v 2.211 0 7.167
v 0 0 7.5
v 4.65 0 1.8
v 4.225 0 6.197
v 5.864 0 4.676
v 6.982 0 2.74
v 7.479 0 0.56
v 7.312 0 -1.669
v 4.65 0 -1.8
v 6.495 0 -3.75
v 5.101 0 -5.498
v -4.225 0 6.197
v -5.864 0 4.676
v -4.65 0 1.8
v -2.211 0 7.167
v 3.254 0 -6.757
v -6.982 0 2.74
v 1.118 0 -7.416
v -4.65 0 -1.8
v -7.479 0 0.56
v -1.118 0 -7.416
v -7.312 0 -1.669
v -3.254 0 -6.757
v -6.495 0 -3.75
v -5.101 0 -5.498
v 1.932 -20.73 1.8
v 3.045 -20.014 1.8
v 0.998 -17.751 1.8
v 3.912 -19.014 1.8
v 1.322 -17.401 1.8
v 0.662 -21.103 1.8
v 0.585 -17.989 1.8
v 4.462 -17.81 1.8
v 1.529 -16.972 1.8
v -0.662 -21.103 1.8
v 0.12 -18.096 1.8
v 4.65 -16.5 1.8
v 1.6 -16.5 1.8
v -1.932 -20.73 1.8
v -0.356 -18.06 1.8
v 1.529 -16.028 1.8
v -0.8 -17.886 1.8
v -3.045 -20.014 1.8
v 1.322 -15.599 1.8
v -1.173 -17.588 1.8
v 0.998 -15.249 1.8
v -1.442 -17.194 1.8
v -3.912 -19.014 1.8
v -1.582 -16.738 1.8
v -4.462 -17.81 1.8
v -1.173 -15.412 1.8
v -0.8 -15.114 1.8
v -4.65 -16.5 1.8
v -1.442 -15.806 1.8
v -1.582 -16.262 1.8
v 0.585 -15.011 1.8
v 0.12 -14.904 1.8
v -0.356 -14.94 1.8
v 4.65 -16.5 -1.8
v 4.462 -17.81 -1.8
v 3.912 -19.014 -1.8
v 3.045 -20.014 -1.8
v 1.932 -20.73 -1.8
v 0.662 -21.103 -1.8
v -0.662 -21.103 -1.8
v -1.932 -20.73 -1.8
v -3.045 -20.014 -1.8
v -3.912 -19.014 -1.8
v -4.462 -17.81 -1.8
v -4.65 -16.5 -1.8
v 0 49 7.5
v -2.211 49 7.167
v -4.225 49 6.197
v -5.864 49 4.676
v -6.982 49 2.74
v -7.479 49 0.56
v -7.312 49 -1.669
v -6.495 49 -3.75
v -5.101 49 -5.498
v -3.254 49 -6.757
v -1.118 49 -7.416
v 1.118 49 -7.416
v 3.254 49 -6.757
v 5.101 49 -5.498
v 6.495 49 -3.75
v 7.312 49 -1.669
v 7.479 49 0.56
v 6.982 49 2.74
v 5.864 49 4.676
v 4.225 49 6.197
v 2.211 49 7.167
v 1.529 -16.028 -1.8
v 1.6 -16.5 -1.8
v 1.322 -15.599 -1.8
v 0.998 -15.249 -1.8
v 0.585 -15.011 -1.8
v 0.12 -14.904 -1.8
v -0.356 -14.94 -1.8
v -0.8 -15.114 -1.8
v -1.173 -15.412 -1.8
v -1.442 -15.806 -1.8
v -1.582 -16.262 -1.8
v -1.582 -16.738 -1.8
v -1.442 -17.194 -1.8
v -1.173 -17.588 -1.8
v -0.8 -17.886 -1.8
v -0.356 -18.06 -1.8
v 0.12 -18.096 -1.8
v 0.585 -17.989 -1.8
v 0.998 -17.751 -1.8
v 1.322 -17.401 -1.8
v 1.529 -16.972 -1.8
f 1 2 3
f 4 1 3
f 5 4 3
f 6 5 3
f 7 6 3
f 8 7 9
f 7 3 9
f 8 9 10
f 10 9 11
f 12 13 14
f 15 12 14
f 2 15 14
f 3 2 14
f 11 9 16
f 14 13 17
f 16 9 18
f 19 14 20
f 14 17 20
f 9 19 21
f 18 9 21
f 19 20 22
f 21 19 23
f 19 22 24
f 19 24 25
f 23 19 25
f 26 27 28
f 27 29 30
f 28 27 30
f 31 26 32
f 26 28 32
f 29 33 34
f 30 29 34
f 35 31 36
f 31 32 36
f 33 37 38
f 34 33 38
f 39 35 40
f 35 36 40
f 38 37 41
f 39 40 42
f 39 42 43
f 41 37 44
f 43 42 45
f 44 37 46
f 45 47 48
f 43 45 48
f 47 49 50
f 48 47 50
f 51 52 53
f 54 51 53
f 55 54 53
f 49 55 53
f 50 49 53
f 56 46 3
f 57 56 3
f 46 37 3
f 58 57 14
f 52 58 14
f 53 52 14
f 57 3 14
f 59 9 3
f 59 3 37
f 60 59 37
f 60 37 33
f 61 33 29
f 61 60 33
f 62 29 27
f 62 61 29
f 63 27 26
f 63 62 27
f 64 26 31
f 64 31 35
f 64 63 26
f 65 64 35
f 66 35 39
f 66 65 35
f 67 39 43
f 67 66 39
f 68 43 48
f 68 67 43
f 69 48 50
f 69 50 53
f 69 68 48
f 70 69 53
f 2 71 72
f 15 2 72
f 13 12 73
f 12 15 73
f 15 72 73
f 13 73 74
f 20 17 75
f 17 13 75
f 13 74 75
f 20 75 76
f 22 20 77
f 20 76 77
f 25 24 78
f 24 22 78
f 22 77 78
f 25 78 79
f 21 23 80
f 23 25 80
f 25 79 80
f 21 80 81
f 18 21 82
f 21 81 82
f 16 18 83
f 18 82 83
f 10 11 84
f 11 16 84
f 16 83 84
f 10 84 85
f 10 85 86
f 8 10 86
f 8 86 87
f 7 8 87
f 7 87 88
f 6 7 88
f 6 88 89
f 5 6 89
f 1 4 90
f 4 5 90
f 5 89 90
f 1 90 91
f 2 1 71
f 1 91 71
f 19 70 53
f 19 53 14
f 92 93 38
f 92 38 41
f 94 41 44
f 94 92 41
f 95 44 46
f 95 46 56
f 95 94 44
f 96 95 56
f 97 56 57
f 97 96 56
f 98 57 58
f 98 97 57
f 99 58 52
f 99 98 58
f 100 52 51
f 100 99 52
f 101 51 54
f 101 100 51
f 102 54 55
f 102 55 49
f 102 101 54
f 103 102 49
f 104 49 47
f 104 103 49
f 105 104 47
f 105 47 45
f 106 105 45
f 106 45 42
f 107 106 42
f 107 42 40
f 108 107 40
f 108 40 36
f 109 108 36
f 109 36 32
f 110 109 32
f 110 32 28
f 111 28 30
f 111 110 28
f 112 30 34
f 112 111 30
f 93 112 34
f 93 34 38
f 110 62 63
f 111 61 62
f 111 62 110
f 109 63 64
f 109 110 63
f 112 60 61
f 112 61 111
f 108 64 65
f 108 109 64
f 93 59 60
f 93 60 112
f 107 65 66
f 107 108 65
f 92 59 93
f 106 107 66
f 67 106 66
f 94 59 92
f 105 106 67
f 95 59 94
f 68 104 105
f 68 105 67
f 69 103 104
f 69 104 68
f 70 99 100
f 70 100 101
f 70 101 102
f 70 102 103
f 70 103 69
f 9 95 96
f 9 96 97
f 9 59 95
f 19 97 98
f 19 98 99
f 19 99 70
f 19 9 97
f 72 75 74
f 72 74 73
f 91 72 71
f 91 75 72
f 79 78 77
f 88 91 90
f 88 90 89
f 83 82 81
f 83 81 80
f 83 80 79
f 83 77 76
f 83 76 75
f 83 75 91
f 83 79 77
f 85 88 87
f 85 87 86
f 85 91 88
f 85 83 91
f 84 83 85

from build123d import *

# Parameters (mm, degrees)
SKETCH_1_R               = 9
EXTRUDE_1_DEPTH          = 52
SKETCH_2_R               = 7.8
EXTRUDE_2_DEPTH          = 12
EXTRUDE_3_DEPTH          = 1.8
EXTRUDE_3_DEPTH_BACK     = 1.8
SKETCH_3_R               = 2.6
EXTRUDE_4_DEPTH          = 1.8
EXTRUDE_4_DEPTH_BACK     = 1.8
SKETCH_4_R               = 1.6
CUT_EXTRUDE_1_DEPTH      = 26
CUT_EXTRUDE_1_DEPTH_BACK = 75
SKETCH_5_R               = 12.444758302
SKETCH_5_R_2             = 7.5
CUT_EXTRUDE_2_DEPTH      = 75
CUT_EXTRUDE_2_DEPTH_BACK = 15
SKETCH_6_R               = 11.570191829


with BuildPart() as part:
    # 草图1 → 凸台-拉伸1 (new body)
    with BuildSketch(Plane(origin=(0, 0, 0), x_dir=(1, 0, 0), z_dir=(0, 1, 0))):
        Circle(SKETCH_1_R)
    extrude(amount=EXTRUDE_1_DEPTH)

    # 草图2 → 凸台-拉伸2 (add)
    with BuildSketch(Plane(origin=(0, 52, 0), x_dir=(1, 0, 0), z_dir=(0, 1, 0))):
        Circle(SKETCH_2_R)
    extrude(amount=EXTRUDE_2_DEPTH)

    # 草图3 → 凸台-拉伸3 (add, two sides: drawn at the far end of the back side and taken through both)
    with BuildSketch(Plane.XY.offset(-EXTRUDE_3_DEPTH_BACK)):
        with BuildLine():
            Line((-4.255, 68.5), (-4.255, 59.5))
            Line((-4.255, 59.5), (4.255, 59.5))
            Line((4.255, 59.5), (4.255, 68.5))
            ThreePointArc((4.255, 68.5), (0, 72.755), (-4.255, 68.5))
        make_face()
        with Locations((0, 68.5)):
            Circle(SKETCH_3_R, mode=Mode.SUBTRACT)
    extrude(amount=EXTRUDE_3_DEPTH + EXTRUDE_3_DEPTH_BACK)

    # 草图4 → 凸台-拉伸4 (add, two sides: drawn at the far end of the back side and taken through both)
    with BuildSketch(Plane.XY.offset(-EXTRUDE_4_DEPTH_BACK)):
        with BuildLine():
            Line((-4.65, -16.5), (-4.65, -8.5))
            Line((-4.65, -8.5), (-4.65, 0))
            Line((-4.65, 0), (4.65, 0))
            Line((4.65, 0), (4.65, -8.5))
            Line((4.65, -8.5), (4.65, -16.5))
            ThreePointArc((4.65, -16.5), (0, -21.15), (-4.65, -16.5))
        make_face()
        with Locations((0, -16.5)):
            Circle(SKETCH_4_R, mode=Mode.SUBTRACT)
    extrude(amount=EXTRUDE_4_DEPTH + EXTRUDE_4_DEPTH_BACK)

    # 草图5 → 切除-拉伸1 (cut, two sides: drawn at the far end of the back side and taken through both)
    with BuildSketch(Plane.XZ.offset(-CUT_EXTRUDE_1_DEPTH_BACK)):
        Circle(SKETCH_5_R)
        Circle(SKETCH_5_R_2, mode=Mode.SUBTRACT)
    extrude(amount=CUT_EXTRUDE_1_DEPTH + CUT_EXTRUDE_1_DEPTH_BACK, mode=Mode.SUBTRACT)

    # 草图6 → 切除-拉伸2 (cut, two sides: drawn at the far end of the back side and taken through both)
    with BuildSketch(Plane(origin=(0, 64, 0), x_dir=(1, 0, 0), z_dir=(0, 1, 0)).offset(-CUT_EXTRUDE_2_DEPTH_BACK)):
        Circle(SKETCH_6_R)
    extrude(amount=CUT_EXTRUDE_2_DEPTH + CUT_EXTRUDE_2_DEPTH_BACK, mode=Mode.SUBTRACT)


solid = part.part
